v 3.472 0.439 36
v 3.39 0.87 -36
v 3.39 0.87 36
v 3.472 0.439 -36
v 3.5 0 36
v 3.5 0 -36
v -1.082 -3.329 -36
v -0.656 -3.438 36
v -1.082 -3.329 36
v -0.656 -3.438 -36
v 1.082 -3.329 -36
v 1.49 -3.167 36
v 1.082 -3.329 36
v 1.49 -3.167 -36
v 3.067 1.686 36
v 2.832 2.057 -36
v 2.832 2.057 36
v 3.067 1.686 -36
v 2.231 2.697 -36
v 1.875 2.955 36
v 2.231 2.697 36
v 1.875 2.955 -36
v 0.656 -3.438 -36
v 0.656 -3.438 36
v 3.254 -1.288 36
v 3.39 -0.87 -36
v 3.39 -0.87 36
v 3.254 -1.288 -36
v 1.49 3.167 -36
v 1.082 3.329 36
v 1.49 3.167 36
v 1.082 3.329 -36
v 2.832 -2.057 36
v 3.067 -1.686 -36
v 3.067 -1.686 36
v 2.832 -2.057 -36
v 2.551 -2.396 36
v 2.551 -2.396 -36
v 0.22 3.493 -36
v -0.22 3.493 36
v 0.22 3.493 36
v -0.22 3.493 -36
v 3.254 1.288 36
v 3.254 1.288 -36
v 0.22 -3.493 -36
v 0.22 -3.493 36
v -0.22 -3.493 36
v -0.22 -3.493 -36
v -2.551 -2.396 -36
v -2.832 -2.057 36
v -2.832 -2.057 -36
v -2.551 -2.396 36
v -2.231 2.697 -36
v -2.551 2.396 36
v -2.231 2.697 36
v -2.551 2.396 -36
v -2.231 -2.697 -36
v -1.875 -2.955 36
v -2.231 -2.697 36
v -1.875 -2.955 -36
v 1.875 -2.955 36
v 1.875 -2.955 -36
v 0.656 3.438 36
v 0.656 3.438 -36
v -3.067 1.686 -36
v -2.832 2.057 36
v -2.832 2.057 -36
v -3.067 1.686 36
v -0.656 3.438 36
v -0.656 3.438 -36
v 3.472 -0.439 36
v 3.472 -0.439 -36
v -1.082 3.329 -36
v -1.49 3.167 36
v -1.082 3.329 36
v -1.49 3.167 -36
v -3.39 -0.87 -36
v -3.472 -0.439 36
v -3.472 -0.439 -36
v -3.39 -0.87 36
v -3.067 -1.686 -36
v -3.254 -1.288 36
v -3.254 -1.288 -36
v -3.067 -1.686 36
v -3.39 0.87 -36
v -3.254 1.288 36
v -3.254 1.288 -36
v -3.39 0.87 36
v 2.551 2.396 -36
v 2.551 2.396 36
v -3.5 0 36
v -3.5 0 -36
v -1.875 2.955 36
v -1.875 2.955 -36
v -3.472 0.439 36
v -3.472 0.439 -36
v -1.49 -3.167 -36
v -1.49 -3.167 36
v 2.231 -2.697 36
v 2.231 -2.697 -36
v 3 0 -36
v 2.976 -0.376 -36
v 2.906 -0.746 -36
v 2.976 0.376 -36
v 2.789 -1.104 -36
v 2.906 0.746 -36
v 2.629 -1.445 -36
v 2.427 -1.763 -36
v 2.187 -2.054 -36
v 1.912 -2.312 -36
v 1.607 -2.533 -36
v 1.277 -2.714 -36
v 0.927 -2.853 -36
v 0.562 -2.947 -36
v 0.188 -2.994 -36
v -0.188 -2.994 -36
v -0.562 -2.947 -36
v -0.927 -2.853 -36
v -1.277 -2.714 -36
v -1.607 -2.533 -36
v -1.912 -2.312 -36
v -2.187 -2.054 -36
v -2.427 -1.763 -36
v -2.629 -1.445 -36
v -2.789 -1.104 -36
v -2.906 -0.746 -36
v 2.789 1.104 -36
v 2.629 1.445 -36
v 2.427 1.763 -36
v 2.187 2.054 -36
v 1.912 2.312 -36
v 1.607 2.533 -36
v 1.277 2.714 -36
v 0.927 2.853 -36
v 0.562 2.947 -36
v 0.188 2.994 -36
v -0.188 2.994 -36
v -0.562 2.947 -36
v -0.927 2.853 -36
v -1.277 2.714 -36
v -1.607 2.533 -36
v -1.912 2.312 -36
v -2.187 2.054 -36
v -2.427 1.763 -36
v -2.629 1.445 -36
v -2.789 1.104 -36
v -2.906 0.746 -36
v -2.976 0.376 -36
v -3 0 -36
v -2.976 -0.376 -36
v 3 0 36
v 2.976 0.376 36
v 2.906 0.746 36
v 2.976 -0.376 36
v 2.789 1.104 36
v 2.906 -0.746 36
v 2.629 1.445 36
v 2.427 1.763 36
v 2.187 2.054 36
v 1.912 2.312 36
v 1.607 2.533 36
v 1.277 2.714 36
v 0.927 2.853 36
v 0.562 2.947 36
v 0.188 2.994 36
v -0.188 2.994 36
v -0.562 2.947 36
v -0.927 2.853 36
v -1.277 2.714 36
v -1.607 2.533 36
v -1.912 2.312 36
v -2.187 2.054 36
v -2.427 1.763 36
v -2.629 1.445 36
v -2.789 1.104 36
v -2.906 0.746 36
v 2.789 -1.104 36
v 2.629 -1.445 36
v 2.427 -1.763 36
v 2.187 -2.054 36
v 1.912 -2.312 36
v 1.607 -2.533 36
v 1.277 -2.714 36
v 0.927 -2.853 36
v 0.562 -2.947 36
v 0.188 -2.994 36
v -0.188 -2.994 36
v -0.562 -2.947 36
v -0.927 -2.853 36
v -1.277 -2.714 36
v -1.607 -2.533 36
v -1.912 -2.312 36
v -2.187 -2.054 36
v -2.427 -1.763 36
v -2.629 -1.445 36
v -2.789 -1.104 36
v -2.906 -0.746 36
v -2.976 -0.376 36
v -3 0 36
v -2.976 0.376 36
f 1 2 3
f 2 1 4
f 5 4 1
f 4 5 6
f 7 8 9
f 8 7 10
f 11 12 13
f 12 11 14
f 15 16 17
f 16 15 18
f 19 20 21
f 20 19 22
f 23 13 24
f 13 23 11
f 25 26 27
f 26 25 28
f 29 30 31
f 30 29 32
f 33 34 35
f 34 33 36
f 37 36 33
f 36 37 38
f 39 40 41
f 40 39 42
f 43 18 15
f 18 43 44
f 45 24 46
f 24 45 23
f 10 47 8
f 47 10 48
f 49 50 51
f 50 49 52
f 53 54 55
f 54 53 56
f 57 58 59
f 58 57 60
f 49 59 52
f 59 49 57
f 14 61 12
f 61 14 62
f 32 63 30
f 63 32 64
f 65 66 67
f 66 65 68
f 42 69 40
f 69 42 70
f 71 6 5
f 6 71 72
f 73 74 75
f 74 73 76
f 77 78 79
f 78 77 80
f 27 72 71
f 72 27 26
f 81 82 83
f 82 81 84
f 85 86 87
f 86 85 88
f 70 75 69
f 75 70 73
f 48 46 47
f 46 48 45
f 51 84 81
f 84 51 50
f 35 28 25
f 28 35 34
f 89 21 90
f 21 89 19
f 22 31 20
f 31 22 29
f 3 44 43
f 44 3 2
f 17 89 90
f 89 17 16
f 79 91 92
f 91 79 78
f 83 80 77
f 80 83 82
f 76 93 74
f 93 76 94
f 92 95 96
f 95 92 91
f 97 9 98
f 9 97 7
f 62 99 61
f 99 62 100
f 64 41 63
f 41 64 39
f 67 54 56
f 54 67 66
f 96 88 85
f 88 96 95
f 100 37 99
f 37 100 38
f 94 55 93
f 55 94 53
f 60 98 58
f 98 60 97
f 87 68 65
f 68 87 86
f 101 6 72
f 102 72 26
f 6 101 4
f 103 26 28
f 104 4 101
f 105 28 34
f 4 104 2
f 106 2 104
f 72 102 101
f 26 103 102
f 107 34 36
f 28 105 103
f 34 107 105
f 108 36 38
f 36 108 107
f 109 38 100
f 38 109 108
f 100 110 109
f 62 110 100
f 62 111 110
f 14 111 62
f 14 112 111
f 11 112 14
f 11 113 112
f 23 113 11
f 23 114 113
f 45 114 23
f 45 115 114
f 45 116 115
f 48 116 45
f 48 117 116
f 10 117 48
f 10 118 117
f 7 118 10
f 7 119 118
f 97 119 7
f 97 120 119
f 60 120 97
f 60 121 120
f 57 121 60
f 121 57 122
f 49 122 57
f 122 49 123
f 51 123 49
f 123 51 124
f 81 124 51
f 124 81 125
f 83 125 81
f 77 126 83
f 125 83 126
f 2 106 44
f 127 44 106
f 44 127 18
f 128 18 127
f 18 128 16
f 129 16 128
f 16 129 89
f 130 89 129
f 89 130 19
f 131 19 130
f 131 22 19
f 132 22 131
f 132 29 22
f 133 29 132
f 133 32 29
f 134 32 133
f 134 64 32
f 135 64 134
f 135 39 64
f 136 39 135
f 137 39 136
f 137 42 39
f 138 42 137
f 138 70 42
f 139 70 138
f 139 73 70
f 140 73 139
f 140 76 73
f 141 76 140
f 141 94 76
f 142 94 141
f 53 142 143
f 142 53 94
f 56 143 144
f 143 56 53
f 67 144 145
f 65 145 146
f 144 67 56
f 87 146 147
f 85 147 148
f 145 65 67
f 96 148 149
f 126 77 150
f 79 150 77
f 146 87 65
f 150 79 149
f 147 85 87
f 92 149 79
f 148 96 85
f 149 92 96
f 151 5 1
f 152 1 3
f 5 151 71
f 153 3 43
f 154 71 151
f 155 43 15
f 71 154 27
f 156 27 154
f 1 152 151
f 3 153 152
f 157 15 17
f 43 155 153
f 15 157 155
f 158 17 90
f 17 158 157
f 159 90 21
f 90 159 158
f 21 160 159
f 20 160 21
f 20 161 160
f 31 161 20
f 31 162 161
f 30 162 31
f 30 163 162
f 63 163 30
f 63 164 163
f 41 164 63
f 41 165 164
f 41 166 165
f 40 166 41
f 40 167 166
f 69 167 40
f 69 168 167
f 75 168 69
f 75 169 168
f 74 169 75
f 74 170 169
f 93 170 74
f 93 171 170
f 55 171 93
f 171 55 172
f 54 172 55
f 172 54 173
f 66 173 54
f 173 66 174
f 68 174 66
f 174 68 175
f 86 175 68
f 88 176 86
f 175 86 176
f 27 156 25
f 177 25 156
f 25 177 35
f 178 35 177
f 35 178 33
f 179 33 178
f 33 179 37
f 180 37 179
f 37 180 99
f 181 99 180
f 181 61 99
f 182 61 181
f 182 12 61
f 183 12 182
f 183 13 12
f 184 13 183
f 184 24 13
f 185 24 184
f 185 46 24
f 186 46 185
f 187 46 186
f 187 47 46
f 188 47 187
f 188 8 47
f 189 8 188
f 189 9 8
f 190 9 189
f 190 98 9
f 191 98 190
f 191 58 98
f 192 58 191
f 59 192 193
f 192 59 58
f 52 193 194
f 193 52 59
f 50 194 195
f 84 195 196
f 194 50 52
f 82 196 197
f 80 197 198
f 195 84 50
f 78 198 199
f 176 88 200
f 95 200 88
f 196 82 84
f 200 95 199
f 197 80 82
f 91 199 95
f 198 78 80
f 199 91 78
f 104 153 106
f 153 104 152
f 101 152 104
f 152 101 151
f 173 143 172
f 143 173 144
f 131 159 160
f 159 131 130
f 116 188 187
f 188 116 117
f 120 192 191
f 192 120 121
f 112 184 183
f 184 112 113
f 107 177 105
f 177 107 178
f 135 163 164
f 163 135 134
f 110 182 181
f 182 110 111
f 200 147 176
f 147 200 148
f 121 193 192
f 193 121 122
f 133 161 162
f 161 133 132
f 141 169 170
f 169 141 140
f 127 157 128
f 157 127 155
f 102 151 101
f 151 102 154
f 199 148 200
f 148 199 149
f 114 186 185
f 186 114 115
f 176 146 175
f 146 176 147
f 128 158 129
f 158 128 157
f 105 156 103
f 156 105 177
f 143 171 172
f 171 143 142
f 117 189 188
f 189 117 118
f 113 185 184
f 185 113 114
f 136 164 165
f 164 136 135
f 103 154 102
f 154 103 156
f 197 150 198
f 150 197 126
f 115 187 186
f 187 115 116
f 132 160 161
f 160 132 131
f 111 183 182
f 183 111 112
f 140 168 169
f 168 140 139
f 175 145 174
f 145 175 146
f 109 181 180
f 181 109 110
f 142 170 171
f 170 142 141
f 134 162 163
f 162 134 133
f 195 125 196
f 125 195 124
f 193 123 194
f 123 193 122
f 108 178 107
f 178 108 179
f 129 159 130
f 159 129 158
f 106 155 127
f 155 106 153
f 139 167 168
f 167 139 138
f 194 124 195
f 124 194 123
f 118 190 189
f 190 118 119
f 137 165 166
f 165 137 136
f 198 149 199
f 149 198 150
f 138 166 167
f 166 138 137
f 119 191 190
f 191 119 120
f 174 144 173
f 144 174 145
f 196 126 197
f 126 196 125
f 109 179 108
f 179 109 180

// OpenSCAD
$fn = 50;


difference() {
	union() {
		translate(v = [0, 0, -36.0000000000]) {
			cylinder(h = 72, r = 3.5000000000);
		}
	}
	union() {
		translate(v = [0, 0, -100.0000000000]) {
			cylinder(h = 200, r = 3.0000000000);
		}
	}
}
